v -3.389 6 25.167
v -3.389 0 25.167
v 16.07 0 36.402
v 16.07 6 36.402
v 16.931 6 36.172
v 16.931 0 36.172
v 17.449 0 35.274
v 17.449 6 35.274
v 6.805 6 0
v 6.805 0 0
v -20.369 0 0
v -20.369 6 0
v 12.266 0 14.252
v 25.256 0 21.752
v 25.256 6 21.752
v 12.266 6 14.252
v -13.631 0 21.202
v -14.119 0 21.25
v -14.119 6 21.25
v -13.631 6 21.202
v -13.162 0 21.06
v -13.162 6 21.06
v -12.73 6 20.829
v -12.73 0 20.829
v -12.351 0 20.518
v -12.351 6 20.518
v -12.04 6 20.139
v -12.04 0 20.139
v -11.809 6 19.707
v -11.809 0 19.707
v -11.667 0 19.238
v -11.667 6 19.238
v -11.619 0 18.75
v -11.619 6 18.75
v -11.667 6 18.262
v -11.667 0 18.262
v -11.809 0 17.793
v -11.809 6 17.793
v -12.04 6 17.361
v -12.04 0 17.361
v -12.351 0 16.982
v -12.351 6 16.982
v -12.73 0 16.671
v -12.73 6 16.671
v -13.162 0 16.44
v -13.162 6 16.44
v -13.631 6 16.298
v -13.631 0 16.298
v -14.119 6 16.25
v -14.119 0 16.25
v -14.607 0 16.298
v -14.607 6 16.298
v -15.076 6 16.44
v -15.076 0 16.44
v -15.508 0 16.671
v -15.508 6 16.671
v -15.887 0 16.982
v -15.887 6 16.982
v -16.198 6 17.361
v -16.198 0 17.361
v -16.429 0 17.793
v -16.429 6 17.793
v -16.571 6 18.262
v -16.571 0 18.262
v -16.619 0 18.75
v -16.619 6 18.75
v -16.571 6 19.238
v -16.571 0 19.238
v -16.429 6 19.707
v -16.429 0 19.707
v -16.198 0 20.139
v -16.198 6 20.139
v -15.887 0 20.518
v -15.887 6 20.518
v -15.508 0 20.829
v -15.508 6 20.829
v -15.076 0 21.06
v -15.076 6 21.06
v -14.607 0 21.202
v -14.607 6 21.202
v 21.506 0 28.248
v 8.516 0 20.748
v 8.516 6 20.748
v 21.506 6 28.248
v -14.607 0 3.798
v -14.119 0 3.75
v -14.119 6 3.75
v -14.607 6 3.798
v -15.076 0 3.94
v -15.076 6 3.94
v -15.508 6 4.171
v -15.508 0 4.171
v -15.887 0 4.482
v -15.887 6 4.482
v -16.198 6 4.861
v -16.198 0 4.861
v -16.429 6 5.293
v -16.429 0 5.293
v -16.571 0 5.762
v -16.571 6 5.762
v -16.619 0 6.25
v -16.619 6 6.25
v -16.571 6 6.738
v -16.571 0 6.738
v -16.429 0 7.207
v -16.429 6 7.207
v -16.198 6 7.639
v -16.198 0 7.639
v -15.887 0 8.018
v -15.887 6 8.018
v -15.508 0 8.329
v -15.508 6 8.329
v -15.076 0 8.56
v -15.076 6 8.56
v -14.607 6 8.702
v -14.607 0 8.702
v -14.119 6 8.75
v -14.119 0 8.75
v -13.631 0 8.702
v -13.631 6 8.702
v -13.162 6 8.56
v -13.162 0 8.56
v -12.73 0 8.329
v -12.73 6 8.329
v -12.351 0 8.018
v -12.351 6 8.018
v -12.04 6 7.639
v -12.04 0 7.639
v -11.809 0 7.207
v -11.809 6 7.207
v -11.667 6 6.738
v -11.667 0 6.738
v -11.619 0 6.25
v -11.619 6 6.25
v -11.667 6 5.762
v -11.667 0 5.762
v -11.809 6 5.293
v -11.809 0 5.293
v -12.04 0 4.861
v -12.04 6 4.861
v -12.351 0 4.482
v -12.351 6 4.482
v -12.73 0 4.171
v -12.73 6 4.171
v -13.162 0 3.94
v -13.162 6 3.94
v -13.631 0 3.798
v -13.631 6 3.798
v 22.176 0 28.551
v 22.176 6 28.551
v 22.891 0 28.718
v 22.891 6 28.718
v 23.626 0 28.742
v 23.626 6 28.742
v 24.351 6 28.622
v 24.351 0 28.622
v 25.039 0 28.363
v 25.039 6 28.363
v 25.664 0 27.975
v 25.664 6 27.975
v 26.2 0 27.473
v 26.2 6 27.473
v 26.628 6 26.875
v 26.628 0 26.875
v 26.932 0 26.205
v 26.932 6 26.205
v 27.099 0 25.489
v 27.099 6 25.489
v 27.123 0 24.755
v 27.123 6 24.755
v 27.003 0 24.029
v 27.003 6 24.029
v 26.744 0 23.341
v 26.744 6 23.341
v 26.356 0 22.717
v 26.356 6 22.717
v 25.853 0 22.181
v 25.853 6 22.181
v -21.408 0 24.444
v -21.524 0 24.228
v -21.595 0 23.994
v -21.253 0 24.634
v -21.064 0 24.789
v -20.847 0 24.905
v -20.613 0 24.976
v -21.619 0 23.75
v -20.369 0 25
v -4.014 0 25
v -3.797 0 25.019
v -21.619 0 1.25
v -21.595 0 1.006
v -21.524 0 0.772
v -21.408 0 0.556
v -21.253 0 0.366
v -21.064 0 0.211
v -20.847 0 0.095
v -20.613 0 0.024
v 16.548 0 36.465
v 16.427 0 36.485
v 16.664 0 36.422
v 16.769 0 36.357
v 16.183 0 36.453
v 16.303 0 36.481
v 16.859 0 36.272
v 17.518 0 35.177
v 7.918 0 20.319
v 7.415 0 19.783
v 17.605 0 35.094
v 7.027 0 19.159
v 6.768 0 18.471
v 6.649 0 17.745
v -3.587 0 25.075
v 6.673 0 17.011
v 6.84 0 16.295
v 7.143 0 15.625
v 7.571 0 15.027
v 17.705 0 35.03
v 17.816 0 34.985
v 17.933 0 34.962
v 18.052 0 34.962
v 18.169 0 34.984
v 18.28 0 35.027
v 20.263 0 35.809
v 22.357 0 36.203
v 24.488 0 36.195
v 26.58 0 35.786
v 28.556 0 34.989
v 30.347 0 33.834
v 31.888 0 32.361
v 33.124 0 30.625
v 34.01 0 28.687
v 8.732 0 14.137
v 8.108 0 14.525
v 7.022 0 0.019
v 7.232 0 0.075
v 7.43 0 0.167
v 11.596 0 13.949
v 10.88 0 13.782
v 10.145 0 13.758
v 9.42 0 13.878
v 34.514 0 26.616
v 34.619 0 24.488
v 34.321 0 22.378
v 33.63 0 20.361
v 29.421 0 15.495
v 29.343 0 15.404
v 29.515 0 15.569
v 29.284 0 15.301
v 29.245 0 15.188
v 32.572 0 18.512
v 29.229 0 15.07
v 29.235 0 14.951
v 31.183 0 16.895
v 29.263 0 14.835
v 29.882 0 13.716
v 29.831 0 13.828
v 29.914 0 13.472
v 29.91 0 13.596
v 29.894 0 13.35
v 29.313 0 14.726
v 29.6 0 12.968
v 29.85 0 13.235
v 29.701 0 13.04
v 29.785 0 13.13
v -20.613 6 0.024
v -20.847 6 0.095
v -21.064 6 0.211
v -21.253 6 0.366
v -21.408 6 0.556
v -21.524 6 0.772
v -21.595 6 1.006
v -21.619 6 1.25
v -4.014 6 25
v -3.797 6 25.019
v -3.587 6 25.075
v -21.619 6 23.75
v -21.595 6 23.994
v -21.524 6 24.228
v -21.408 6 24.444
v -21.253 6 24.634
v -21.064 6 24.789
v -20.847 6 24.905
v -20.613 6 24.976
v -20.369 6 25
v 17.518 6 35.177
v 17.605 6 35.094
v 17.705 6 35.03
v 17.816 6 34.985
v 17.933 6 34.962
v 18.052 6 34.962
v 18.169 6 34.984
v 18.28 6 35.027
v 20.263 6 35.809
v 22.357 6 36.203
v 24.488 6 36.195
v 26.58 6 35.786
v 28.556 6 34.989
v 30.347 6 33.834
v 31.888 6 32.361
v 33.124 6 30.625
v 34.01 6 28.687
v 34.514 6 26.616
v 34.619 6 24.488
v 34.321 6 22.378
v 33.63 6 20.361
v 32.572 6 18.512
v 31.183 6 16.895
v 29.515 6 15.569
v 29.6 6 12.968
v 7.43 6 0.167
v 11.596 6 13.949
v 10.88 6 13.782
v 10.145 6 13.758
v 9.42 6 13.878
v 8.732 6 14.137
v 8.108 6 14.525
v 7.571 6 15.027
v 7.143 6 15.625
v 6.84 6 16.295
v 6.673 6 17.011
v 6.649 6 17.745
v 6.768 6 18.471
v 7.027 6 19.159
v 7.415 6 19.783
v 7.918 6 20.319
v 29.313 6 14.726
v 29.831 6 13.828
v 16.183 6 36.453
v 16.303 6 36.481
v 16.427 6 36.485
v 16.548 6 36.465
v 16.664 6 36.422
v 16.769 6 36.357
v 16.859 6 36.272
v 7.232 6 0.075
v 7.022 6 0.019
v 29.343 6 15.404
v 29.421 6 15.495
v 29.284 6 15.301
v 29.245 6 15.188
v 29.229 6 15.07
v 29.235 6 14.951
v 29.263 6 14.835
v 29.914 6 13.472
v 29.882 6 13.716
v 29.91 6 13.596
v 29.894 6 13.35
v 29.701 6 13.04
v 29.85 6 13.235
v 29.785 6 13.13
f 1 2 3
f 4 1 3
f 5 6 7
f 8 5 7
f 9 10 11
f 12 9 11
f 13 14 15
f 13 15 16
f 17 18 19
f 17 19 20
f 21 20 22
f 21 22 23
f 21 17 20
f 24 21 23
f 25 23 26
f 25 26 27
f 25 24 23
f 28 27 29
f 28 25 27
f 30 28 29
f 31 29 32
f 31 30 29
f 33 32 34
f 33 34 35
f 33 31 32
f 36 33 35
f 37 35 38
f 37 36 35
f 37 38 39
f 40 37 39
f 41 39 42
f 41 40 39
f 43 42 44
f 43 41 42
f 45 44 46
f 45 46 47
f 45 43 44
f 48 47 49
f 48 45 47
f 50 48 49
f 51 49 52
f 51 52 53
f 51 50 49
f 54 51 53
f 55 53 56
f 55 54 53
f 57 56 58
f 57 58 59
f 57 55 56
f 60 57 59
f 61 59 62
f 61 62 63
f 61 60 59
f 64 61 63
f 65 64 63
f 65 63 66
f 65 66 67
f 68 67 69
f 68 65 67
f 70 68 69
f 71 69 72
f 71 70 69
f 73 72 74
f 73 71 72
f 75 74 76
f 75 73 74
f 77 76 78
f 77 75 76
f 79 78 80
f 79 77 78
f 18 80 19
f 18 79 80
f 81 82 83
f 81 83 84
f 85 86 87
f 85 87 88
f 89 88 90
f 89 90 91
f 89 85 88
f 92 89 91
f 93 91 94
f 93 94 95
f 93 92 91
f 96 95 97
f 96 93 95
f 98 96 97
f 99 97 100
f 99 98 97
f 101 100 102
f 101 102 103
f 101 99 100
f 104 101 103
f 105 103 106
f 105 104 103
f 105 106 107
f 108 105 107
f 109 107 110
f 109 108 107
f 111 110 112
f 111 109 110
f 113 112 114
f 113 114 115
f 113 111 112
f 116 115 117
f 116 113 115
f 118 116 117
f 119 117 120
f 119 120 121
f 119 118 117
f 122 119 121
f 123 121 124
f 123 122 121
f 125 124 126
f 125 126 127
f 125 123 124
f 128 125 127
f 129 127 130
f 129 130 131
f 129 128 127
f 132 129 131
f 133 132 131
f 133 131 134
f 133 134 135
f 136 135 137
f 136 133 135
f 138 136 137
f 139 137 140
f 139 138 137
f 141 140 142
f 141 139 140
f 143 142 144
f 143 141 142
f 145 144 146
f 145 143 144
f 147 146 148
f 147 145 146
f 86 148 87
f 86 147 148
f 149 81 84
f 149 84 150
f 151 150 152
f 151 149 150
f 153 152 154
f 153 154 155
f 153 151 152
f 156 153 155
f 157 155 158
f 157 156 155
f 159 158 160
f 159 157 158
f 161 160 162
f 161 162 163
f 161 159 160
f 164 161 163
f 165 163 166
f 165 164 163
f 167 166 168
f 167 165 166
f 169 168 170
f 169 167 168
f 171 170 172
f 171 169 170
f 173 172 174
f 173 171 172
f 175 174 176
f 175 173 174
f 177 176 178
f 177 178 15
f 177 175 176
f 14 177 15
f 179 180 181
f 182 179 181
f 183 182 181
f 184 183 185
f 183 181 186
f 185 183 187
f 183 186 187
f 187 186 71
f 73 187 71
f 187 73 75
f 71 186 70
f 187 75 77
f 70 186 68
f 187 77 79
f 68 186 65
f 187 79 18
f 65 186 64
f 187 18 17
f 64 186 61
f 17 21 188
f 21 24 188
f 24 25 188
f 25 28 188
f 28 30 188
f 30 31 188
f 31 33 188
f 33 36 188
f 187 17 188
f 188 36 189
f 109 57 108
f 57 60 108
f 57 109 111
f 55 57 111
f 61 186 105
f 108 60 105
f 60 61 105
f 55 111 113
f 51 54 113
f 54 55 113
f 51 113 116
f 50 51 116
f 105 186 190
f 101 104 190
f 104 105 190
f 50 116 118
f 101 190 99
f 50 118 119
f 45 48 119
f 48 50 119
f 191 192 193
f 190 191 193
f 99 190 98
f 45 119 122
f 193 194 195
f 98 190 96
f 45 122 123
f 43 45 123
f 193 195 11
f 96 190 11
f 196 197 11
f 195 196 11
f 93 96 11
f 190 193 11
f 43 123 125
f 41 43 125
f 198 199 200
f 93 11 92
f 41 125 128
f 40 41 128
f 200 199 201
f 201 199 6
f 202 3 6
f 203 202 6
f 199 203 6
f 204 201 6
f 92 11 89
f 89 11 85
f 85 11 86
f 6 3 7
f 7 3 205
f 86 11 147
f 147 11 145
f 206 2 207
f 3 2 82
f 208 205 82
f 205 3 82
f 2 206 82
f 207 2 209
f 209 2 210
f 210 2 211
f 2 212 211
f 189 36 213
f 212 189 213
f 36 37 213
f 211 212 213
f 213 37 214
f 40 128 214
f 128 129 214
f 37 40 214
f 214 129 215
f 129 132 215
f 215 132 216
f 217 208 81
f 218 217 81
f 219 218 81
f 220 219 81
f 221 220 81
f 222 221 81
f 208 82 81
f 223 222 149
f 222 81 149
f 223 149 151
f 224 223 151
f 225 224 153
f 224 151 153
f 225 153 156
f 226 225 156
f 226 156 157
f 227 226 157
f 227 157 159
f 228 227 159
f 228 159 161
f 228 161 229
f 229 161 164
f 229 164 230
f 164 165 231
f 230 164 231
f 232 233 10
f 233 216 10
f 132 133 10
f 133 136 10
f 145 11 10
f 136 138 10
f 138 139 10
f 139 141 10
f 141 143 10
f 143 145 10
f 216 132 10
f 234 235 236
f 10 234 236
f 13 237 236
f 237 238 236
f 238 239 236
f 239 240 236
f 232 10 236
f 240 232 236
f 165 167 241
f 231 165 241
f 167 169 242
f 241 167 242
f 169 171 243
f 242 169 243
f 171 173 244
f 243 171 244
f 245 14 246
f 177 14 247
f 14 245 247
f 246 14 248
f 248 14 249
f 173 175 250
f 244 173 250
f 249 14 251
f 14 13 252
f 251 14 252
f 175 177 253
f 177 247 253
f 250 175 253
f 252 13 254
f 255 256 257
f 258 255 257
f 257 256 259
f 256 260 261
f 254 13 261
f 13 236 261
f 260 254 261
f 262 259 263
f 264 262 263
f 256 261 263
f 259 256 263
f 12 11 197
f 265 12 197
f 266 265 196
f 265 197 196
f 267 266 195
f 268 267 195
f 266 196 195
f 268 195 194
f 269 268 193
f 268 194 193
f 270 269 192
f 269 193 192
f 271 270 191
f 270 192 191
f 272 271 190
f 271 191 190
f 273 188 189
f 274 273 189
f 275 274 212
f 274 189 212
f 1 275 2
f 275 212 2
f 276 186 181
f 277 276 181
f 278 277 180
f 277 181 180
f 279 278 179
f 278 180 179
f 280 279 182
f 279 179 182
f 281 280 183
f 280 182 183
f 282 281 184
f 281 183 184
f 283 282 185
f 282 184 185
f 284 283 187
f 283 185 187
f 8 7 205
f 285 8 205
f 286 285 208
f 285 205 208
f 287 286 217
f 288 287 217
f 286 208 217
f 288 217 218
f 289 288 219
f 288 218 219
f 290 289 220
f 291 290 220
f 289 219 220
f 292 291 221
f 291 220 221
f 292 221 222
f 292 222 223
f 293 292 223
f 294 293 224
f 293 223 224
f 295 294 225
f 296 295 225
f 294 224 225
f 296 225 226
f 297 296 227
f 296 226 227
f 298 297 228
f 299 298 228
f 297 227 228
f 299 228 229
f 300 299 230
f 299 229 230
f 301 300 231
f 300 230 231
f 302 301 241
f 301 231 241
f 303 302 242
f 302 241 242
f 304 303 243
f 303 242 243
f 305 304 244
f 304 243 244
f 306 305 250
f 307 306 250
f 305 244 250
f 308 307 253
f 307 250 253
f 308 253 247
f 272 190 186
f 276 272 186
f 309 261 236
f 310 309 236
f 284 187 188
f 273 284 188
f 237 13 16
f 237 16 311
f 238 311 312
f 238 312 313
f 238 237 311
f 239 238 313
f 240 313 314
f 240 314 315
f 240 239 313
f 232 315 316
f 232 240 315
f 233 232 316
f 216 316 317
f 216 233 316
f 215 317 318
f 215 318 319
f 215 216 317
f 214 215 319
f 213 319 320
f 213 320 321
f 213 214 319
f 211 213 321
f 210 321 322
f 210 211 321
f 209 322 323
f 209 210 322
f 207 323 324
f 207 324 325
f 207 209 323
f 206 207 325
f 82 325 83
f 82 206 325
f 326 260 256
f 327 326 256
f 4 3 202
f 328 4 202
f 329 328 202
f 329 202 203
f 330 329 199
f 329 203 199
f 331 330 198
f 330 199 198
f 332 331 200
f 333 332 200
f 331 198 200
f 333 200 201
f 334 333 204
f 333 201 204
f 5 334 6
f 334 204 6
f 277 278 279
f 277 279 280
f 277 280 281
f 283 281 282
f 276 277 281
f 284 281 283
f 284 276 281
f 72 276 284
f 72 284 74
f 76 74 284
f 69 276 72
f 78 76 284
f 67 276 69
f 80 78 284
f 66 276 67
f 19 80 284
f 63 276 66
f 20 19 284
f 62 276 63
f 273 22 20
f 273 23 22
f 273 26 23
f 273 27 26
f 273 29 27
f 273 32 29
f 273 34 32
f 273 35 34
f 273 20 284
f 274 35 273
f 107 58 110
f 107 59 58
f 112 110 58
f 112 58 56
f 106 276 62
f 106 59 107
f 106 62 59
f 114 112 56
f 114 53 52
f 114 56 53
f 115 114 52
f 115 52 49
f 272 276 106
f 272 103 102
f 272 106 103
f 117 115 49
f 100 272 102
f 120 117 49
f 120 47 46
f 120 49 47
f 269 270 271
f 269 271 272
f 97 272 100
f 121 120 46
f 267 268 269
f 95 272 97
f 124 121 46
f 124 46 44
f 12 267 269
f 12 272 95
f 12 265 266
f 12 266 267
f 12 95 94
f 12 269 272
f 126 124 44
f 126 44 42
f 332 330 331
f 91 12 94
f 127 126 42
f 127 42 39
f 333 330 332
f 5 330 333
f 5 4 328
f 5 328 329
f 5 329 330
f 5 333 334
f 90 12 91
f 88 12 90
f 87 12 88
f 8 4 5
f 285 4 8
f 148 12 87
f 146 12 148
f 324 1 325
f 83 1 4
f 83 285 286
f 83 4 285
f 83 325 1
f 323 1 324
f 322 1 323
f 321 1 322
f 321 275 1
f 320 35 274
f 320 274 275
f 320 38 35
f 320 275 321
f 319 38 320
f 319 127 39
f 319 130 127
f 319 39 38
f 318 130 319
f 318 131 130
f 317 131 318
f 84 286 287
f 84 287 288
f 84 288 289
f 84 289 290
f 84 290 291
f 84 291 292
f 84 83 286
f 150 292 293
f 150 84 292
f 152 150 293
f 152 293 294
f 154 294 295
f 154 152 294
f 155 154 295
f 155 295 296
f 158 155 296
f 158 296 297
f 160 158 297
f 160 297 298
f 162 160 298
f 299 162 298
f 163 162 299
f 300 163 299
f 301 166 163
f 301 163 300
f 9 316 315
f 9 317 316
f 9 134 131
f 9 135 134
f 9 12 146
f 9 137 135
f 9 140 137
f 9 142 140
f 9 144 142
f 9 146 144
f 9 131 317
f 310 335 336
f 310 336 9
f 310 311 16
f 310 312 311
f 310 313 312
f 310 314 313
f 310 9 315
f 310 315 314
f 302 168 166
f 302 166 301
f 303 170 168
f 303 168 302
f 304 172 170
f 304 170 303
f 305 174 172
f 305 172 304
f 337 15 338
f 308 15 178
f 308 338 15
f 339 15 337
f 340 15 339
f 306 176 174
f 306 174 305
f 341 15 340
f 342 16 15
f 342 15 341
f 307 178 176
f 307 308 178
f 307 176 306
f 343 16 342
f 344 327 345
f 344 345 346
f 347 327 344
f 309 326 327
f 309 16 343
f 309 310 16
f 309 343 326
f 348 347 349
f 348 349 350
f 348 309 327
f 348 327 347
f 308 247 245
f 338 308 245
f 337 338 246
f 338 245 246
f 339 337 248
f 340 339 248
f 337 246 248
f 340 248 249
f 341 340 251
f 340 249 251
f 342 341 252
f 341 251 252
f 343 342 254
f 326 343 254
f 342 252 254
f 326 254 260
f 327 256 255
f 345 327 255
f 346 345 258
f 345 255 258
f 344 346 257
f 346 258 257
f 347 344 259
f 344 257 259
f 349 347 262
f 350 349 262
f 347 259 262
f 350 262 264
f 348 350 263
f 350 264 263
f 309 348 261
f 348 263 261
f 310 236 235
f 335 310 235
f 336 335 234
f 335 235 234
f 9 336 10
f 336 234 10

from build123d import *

# Parameters (mm, degrees)
SKETCH1_R           = 2.5
BOSS_EXTRUDE1_DEPTH = 6


with BuildPart() as part:
    # Sketch1 → Boss-Extrude1 (new body)
    with BuildSketch(Plane(origin=(0, 0, 0), x_dir=(1, 0, 0), z_dir=(0, 1, 0))):
        with BuildLine():
            Line((29.312544284, -14.726094949), (29.830902437, -13.828272291))
            ThreePointArc((29.830902437, -13.828272291), (29.893839703, -13.350216293), (29.600306432, -12.967676287))
            Line((29.600306432, -12.967676287), (7.429695757, -0.167468245))
            ThreePointArc((7.429695757, -0.167468245), (7.128219563, -0.042592717), (6.804695757, 0))
            Line((6.804695757, 0), (-20.369097563, 0))
            ThreePointArc((-20.369097563, 0), (-21.25298104, -0.366116524), (-21.619097563, -1.25))
            Line((-21.619097563, -1.25), (-21.619097563, -23.75))
            ThreePointArc((-21.619097563, -23.75), (-21.25298104, -24.633883476), (-20.369097563, -25))
            Line((-20.369097563, -25), (-4.014034054, -25))
            ThreePointArc((-4.014034054, -25), (-3.690510247, -25.042592717), (-3.389034054, -25.167468245))
            Line((-3.389034054, -25.167468245), (16.070306432, -36.402323713))
            ThreePointArc((16.070306432, -36.402323713), (16.548362431, -36.465260979), (16.930902437, -36.171727709))
            Line((16.930902437, -36.171727709), (17.44926059, -35.273905051))
            ThreePointArc((17.44926059, -35.273905051), (17.815716934, -34.984910861), (18.280480237, -35.027372208))
            ThreePointArc((18.280480237, -35.027372208), (33.123688229, -30.625), (29.514650402, -15.569218702))
            ThreePointArc((29.514650402, -15.569218702), (29.245496145, -15.187952547), (29.312544284, -14.726094949))
        make_face()
        with Locations(Location((-14.119097563, -18.75, 0), (0, 0, 270))):
            Circle(SKETCH1_R, mode=Mode.SUBTRACT)
        with Locations(Location((-14.119097563, -6.25, 0), (0, 0, 90))):
            Circle(SKETCH1_R, mode=Mode.SUBTRACT)
        with BuildLine():
            Line((25.255902437, -21.752404736), (12.26552138, -14.252404736))
            ThreePointArc((12.26552138, -14.252404736), (7.142926116, -15.625), (8.51552138, -20.747595264))
            Line((8.51552138, -20.747595264), (21.505902437, -28.247595264))
            ThreePointArc((21.505902437, -28.247595264), (26.628497701, -26.875), (25.255902437, -21.752404736))
        make_face(mode=Mode.SUBTRACT)
    extrude(amount=BOSS_EXTRUDE1_DEPTH)


solid = part.part
